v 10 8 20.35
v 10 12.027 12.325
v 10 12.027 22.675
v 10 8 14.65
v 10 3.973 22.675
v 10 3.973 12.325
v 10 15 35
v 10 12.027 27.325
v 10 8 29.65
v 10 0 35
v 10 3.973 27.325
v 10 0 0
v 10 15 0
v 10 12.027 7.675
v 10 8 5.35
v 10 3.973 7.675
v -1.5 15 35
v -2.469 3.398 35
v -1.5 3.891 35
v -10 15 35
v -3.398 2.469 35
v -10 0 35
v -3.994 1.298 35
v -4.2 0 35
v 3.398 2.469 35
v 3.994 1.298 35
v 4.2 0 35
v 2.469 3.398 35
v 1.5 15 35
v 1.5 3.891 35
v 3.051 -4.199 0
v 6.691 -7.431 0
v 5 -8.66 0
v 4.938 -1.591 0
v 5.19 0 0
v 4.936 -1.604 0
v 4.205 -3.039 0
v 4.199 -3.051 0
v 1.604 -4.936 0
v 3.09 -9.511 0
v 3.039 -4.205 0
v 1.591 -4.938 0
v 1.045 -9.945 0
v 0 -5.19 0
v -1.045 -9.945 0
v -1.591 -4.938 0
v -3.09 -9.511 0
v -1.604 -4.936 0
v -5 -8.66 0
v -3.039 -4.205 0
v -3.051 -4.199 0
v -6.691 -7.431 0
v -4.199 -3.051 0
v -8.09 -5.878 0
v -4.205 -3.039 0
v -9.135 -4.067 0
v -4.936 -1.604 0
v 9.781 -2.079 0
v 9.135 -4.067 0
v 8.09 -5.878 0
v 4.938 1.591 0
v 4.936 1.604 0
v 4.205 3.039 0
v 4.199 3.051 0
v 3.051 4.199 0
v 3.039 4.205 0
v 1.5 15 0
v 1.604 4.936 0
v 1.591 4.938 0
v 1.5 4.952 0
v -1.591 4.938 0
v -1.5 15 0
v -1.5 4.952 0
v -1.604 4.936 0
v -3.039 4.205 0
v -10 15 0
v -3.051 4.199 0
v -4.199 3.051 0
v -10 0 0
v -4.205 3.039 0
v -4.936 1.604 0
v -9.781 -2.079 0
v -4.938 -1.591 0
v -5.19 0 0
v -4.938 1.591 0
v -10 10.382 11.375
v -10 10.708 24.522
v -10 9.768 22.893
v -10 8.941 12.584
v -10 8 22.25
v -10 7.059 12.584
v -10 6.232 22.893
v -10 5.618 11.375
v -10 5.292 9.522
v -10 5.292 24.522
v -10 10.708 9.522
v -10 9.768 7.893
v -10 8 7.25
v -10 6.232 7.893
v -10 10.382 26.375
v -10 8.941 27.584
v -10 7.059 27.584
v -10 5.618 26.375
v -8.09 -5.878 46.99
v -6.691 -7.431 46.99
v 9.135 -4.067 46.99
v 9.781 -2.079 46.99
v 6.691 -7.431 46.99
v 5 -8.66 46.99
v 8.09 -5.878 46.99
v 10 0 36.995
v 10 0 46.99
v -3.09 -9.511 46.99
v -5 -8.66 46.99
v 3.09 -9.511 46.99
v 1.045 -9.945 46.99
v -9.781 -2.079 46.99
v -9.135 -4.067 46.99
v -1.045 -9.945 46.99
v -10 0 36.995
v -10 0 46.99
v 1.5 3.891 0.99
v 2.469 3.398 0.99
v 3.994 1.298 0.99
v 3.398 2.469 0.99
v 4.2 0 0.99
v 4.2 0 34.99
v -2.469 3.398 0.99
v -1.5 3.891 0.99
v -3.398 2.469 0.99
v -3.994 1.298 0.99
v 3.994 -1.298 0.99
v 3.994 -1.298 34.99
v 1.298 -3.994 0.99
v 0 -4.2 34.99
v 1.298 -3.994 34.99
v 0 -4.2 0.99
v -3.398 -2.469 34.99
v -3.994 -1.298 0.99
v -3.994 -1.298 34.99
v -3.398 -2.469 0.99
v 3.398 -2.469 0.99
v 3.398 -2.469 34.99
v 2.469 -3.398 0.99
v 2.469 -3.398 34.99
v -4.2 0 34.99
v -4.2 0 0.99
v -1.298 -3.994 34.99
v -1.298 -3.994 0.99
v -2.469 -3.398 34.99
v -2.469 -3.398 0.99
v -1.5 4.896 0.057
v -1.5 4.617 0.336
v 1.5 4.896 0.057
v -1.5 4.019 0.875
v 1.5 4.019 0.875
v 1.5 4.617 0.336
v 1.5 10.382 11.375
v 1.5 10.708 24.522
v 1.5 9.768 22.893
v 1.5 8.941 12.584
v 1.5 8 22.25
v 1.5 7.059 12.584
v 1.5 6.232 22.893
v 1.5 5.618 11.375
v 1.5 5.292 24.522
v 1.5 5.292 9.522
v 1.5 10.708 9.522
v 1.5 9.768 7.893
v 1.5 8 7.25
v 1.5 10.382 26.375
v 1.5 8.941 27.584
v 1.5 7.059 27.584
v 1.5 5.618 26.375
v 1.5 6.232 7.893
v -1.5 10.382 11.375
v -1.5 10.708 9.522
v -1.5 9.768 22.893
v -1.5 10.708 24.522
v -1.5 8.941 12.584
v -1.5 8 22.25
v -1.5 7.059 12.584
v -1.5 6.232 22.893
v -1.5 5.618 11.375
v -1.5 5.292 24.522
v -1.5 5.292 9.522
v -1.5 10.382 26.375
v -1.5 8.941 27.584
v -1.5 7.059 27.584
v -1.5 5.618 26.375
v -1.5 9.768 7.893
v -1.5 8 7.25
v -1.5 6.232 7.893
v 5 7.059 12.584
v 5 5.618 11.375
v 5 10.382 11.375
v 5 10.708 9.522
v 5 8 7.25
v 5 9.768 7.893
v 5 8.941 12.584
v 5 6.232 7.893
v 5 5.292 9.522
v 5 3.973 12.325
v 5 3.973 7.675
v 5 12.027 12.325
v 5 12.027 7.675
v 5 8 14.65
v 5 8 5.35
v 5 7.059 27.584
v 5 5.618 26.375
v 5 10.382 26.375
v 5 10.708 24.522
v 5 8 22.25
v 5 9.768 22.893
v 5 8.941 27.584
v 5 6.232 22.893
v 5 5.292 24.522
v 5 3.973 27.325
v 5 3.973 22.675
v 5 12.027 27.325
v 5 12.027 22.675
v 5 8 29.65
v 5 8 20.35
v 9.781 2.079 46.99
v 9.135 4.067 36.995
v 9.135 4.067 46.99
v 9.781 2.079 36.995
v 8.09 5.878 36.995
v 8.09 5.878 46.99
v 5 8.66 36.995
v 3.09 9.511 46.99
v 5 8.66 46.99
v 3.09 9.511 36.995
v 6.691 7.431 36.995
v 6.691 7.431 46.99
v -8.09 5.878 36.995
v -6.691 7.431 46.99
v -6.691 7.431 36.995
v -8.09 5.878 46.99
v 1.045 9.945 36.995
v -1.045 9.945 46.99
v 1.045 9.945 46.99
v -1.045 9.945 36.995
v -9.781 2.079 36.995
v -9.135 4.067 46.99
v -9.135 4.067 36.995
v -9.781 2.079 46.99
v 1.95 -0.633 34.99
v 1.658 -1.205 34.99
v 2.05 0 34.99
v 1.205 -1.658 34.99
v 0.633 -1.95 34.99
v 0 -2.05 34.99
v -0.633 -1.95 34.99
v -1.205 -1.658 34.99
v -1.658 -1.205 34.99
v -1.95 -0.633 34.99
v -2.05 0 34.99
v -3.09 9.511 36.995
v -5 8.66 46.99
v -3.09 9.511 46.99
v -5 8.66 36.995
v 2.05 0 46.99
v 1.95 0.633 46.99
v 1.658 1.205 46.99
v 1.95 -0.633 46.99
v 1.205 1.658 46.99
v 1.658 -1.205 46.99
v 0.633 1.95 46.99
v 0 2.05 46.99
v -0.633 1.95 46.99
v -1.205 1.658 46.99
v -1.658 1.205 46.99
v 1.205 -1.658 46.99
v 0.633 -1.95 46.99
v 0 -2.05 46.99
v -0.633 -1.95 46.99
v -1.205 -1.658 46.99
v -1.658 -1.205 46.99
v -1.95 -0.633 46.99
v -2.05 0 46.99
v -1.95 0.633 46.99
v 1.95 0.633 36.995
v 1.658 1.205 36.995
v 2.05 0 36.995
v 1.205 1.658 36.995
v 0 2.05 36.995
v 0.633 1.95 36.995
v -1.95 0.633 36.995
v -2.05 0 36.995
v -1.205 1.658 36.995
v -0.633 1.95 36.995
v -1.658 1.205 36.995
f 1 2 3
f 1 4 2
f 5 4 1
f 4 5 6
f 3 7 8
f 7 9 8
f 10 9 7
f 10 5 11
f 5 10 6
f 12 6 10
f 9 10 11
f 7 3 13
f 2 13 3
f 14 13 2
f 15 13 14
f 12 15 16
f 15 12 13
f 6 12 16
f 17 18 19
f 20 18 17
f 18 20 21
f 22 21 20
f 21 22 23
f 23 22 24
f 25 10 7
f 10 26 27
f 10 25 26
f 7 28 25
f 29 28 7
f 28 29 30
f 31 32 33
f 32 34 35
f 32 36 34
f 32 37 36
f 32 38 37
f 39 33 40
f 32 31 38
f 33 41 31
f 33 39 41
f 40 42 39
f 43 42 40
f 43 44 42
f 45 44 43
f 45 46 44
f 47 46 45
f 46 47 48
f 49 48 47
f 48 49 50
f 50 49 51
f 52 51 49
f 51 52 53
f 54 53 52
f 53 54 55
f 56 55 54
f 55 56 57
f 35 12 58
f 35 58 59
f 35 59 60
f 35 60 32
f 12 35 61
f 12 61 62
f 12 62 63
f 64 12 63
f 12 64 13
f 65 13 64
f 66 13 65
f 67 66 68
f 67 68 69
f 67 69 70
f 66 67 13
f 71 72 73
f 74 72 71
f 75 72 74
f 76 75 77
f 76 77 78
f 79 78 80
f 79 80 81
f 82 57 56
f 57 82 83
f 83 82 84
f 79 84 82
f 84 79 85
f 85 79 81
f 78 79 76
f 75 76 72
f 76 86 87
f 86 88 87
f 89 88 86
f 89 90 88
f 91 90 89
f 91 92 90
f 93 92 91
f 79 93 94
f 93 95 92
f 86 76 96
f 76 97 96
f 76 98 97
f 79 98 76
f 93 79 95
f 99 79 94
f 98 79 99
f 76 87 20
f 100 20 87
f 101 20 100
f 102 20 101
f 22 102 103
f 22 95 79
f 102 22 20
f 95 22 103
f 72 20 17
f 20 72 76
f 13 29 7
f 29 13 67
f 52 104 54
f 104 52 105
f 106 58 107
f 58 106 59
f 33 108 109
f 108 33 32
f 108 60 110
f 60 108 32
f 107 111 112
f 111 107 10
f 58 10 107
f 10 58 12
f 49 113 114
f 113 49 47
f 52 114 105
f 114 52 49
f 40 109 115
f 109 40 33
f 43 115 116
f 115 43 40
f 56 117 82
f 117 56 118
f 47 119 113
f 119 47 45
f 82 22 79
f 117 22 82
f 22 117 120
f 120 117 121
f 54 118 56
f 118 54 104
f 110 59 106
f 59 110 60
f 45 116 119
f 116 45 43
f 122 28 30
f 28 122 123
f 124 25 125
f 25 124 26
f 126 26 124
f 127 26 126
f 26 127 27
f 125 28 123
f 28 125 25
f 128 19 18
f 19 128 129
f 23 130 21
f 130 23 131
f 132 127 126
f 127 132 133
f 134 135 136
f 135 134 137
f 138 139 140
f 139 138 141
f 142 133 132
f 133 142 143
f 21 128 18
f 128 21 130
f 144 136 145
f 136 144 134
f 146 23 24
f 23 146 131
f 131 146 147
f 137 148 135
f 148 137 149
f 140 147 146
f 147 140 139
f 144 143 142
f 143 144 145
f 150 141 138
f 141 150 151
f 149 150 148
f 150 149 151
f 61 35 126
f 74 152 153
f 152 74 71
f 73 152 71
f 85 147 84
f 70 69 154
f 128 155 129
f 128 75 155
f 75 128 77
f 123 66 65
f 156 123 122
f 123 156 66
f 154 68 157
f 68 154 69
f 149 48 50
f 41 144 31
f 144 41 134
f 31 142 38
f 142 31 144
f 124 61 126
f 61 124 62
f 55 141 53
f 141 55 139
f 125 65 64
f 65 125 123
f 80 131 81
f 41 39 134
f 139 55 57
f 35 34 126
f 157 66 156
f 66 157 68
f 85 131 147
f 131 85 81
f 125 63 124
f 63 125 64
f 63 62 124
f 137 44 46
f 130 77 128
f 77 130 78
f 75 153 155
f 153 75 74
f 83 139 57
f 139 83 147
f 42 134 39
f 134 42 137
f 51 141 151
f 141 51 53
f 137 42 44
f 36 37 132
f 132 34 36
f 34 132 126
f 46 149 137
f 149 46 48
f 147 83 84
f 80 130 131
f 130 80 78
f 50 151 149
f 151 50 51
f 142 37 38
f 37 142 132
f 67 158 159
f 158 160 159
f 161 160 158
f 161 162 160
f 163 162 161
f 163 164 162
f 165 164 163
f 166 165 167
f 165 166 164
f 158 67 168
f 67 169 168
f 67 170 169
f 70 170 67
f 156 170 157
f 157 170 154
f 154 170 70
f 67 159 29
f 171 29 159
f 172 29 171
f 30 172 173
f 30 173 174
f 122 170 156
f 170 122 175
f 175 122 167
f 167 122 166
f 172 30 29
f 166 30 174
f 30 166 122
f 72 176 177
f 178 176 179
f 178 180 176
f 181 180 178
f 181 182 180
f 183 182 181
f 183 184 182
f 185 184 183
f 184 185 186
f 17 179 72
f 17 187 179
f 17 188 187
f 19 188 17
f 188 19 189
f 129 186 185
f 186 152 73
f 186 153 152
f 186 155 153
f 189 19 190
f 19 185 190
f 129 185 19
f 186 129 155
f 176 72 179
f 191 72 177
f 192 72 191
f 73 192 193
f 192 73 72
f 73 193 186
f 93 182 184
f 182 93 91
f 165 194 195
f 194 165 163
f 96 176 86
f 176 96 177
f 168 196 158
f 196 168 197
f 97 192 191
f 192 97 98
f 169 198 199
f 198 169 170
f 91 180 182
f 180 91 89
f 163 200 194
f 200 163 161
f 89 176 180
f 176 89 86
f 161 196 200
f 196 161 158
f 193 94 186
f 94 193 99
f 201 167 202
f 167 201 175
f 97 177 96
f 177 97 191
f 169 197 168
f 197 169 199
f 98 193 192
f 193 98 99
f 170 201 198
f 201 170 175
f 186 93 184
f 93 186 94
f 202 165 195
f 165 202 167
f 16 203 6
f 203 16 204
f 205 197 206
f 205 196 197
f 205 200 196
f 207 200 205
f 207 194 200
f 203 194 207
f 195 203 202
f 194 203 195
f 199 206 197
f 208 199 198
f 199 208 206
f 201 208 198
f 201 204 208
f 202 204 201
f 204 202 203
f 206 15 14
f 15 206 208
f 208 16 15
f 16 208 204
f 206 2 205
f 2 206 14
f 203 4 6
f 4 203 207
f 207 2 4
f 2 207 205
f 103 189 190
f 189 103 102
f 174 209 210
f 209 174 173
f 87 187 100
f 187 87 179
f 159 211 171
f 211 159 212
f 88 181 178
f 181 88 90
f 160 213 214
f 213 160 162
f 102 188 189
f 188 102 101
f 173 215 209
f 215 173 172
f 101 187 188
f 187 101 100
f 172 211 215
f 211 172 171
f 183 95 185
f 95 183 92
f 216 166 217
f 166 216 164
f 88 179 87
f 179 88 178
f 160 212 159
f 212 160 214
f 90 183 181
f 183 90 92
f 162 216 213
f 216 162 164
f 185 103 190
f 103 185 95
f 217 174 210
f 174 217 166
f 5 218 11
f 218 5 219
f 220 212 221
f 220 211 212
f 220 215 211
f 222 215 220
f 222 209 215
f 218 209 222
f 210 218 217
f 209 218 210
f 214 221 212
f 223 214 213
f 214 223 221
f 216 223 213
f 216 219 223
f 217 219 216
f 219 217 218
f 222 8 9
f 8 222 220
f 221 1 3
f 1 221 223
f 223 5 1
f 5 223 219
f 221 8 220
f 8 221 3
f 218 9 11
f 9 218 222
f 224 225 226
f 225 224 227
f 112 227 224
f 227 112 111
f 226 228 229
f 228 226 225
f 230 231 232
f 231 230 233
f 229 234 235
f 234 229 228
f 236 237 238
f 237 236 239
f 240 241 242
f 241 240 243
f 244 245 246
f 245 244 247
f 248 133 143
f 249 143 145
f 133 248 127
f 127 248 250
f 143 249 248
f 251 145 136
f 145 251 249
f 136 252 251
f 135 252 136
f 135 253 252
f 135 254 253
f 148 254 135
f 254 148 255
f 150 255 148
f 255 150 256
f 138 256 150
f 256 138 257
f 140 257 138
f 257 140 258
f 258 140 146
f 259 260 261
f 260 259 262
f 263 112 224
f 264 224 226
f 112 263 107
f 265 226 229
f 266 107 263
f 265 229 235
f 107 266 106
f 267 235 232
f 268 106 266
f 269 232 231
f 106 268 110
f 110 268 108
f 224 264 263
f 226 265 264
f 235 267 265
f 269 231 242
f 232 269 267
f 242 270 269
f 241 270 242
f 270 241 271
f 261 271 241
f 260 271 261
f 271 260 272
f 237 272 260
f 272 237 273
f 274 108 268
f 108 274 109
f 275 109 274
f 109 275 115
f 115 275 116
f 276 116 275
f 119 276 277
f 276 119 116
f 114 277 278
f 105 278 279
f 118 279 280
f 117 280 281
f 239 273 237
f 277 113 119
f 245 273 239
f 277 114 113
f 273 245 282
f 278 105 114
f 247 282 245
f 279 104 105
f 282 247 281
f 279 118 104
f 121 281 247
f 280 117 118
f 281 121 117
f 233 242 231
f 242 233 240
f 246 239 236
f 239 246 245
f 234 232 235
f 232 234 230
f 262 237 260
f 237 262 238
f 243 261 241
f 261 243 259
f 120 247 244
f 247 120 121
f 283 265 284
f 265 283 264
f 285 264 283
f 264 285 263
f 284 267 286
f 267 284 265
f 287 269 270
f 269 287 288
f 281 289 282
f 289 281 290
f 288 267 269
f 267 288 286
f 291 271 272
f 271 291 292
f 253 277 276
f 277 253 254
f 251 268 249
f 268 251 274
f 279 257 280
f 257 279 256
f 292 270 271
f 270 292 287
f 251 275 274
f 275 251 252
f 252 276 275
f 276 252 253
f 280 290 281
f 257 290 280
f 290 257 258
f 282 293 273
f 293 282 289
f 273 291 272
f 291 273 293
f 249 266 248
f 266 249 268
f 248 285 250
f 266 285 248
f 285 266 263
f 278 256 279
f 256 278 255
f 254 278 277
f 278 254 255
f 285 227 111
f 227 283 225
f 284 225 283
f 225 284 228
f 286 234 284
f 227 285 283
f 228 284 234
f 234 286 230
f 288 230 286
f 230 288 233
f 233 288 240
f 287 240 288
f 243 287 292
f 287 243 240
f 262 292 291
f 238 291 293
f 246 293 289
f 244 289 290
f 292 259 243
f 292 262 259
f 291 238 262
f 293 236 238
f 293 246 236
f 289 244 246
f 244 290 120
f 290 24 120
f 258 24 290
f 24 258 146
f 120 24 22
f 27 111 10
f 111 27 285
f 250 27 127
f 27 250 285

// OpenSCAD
//rod_r=6/2+.2; //.4 too big, 0 too small
rod_r=8/2+.2;
m4_r=4.5/2-.2;
difference()
{
    union()
    {
        translate([0,15/2,35/2])cube([20,15,35],center=true);
        cylinder(r=20/2,h=35);
    }
    translate([0,0,-1])cylinder(r=rod_r,h=40,$fn=20);
    translate([0,0,-0.01])cylinder(r2=rod_r,r1=rod_r+1,h=1,$fn=20);
    //cutout
    translate([0,10,19])cube([3,20,40],center=true);
    //screw close
    translate([0,8,10])rotate([0,90,0])cylinder(r=5.5/2,h=40,center=true);
    translate([15,8,10])rotate([0,90,0])cylinder(r=9.3/2,h=20,center=true,$fn=6);
    translate([0,8,25])rotate([0,90,0])cylinder(r=5.5/2,h=40,center=true);
    translate([15,8,25])rotate([0,90,0])cylinder(r=9.3/2,h=20,center=true,$fn=6);
}

translate([0,0,35-0.01])difference()
{
    cylinder(r=20/2,h=12);
    translate([0,0,-1])cylinder(r=m4_r,h=40,$fn=20);
    //translate([0,0,-0.01])cylinder(r2=m4_r,r1=m4_r+1,h=1,$fn=20);
    translate([0,10,1])cube([20,20,2.01],center=true);
}
